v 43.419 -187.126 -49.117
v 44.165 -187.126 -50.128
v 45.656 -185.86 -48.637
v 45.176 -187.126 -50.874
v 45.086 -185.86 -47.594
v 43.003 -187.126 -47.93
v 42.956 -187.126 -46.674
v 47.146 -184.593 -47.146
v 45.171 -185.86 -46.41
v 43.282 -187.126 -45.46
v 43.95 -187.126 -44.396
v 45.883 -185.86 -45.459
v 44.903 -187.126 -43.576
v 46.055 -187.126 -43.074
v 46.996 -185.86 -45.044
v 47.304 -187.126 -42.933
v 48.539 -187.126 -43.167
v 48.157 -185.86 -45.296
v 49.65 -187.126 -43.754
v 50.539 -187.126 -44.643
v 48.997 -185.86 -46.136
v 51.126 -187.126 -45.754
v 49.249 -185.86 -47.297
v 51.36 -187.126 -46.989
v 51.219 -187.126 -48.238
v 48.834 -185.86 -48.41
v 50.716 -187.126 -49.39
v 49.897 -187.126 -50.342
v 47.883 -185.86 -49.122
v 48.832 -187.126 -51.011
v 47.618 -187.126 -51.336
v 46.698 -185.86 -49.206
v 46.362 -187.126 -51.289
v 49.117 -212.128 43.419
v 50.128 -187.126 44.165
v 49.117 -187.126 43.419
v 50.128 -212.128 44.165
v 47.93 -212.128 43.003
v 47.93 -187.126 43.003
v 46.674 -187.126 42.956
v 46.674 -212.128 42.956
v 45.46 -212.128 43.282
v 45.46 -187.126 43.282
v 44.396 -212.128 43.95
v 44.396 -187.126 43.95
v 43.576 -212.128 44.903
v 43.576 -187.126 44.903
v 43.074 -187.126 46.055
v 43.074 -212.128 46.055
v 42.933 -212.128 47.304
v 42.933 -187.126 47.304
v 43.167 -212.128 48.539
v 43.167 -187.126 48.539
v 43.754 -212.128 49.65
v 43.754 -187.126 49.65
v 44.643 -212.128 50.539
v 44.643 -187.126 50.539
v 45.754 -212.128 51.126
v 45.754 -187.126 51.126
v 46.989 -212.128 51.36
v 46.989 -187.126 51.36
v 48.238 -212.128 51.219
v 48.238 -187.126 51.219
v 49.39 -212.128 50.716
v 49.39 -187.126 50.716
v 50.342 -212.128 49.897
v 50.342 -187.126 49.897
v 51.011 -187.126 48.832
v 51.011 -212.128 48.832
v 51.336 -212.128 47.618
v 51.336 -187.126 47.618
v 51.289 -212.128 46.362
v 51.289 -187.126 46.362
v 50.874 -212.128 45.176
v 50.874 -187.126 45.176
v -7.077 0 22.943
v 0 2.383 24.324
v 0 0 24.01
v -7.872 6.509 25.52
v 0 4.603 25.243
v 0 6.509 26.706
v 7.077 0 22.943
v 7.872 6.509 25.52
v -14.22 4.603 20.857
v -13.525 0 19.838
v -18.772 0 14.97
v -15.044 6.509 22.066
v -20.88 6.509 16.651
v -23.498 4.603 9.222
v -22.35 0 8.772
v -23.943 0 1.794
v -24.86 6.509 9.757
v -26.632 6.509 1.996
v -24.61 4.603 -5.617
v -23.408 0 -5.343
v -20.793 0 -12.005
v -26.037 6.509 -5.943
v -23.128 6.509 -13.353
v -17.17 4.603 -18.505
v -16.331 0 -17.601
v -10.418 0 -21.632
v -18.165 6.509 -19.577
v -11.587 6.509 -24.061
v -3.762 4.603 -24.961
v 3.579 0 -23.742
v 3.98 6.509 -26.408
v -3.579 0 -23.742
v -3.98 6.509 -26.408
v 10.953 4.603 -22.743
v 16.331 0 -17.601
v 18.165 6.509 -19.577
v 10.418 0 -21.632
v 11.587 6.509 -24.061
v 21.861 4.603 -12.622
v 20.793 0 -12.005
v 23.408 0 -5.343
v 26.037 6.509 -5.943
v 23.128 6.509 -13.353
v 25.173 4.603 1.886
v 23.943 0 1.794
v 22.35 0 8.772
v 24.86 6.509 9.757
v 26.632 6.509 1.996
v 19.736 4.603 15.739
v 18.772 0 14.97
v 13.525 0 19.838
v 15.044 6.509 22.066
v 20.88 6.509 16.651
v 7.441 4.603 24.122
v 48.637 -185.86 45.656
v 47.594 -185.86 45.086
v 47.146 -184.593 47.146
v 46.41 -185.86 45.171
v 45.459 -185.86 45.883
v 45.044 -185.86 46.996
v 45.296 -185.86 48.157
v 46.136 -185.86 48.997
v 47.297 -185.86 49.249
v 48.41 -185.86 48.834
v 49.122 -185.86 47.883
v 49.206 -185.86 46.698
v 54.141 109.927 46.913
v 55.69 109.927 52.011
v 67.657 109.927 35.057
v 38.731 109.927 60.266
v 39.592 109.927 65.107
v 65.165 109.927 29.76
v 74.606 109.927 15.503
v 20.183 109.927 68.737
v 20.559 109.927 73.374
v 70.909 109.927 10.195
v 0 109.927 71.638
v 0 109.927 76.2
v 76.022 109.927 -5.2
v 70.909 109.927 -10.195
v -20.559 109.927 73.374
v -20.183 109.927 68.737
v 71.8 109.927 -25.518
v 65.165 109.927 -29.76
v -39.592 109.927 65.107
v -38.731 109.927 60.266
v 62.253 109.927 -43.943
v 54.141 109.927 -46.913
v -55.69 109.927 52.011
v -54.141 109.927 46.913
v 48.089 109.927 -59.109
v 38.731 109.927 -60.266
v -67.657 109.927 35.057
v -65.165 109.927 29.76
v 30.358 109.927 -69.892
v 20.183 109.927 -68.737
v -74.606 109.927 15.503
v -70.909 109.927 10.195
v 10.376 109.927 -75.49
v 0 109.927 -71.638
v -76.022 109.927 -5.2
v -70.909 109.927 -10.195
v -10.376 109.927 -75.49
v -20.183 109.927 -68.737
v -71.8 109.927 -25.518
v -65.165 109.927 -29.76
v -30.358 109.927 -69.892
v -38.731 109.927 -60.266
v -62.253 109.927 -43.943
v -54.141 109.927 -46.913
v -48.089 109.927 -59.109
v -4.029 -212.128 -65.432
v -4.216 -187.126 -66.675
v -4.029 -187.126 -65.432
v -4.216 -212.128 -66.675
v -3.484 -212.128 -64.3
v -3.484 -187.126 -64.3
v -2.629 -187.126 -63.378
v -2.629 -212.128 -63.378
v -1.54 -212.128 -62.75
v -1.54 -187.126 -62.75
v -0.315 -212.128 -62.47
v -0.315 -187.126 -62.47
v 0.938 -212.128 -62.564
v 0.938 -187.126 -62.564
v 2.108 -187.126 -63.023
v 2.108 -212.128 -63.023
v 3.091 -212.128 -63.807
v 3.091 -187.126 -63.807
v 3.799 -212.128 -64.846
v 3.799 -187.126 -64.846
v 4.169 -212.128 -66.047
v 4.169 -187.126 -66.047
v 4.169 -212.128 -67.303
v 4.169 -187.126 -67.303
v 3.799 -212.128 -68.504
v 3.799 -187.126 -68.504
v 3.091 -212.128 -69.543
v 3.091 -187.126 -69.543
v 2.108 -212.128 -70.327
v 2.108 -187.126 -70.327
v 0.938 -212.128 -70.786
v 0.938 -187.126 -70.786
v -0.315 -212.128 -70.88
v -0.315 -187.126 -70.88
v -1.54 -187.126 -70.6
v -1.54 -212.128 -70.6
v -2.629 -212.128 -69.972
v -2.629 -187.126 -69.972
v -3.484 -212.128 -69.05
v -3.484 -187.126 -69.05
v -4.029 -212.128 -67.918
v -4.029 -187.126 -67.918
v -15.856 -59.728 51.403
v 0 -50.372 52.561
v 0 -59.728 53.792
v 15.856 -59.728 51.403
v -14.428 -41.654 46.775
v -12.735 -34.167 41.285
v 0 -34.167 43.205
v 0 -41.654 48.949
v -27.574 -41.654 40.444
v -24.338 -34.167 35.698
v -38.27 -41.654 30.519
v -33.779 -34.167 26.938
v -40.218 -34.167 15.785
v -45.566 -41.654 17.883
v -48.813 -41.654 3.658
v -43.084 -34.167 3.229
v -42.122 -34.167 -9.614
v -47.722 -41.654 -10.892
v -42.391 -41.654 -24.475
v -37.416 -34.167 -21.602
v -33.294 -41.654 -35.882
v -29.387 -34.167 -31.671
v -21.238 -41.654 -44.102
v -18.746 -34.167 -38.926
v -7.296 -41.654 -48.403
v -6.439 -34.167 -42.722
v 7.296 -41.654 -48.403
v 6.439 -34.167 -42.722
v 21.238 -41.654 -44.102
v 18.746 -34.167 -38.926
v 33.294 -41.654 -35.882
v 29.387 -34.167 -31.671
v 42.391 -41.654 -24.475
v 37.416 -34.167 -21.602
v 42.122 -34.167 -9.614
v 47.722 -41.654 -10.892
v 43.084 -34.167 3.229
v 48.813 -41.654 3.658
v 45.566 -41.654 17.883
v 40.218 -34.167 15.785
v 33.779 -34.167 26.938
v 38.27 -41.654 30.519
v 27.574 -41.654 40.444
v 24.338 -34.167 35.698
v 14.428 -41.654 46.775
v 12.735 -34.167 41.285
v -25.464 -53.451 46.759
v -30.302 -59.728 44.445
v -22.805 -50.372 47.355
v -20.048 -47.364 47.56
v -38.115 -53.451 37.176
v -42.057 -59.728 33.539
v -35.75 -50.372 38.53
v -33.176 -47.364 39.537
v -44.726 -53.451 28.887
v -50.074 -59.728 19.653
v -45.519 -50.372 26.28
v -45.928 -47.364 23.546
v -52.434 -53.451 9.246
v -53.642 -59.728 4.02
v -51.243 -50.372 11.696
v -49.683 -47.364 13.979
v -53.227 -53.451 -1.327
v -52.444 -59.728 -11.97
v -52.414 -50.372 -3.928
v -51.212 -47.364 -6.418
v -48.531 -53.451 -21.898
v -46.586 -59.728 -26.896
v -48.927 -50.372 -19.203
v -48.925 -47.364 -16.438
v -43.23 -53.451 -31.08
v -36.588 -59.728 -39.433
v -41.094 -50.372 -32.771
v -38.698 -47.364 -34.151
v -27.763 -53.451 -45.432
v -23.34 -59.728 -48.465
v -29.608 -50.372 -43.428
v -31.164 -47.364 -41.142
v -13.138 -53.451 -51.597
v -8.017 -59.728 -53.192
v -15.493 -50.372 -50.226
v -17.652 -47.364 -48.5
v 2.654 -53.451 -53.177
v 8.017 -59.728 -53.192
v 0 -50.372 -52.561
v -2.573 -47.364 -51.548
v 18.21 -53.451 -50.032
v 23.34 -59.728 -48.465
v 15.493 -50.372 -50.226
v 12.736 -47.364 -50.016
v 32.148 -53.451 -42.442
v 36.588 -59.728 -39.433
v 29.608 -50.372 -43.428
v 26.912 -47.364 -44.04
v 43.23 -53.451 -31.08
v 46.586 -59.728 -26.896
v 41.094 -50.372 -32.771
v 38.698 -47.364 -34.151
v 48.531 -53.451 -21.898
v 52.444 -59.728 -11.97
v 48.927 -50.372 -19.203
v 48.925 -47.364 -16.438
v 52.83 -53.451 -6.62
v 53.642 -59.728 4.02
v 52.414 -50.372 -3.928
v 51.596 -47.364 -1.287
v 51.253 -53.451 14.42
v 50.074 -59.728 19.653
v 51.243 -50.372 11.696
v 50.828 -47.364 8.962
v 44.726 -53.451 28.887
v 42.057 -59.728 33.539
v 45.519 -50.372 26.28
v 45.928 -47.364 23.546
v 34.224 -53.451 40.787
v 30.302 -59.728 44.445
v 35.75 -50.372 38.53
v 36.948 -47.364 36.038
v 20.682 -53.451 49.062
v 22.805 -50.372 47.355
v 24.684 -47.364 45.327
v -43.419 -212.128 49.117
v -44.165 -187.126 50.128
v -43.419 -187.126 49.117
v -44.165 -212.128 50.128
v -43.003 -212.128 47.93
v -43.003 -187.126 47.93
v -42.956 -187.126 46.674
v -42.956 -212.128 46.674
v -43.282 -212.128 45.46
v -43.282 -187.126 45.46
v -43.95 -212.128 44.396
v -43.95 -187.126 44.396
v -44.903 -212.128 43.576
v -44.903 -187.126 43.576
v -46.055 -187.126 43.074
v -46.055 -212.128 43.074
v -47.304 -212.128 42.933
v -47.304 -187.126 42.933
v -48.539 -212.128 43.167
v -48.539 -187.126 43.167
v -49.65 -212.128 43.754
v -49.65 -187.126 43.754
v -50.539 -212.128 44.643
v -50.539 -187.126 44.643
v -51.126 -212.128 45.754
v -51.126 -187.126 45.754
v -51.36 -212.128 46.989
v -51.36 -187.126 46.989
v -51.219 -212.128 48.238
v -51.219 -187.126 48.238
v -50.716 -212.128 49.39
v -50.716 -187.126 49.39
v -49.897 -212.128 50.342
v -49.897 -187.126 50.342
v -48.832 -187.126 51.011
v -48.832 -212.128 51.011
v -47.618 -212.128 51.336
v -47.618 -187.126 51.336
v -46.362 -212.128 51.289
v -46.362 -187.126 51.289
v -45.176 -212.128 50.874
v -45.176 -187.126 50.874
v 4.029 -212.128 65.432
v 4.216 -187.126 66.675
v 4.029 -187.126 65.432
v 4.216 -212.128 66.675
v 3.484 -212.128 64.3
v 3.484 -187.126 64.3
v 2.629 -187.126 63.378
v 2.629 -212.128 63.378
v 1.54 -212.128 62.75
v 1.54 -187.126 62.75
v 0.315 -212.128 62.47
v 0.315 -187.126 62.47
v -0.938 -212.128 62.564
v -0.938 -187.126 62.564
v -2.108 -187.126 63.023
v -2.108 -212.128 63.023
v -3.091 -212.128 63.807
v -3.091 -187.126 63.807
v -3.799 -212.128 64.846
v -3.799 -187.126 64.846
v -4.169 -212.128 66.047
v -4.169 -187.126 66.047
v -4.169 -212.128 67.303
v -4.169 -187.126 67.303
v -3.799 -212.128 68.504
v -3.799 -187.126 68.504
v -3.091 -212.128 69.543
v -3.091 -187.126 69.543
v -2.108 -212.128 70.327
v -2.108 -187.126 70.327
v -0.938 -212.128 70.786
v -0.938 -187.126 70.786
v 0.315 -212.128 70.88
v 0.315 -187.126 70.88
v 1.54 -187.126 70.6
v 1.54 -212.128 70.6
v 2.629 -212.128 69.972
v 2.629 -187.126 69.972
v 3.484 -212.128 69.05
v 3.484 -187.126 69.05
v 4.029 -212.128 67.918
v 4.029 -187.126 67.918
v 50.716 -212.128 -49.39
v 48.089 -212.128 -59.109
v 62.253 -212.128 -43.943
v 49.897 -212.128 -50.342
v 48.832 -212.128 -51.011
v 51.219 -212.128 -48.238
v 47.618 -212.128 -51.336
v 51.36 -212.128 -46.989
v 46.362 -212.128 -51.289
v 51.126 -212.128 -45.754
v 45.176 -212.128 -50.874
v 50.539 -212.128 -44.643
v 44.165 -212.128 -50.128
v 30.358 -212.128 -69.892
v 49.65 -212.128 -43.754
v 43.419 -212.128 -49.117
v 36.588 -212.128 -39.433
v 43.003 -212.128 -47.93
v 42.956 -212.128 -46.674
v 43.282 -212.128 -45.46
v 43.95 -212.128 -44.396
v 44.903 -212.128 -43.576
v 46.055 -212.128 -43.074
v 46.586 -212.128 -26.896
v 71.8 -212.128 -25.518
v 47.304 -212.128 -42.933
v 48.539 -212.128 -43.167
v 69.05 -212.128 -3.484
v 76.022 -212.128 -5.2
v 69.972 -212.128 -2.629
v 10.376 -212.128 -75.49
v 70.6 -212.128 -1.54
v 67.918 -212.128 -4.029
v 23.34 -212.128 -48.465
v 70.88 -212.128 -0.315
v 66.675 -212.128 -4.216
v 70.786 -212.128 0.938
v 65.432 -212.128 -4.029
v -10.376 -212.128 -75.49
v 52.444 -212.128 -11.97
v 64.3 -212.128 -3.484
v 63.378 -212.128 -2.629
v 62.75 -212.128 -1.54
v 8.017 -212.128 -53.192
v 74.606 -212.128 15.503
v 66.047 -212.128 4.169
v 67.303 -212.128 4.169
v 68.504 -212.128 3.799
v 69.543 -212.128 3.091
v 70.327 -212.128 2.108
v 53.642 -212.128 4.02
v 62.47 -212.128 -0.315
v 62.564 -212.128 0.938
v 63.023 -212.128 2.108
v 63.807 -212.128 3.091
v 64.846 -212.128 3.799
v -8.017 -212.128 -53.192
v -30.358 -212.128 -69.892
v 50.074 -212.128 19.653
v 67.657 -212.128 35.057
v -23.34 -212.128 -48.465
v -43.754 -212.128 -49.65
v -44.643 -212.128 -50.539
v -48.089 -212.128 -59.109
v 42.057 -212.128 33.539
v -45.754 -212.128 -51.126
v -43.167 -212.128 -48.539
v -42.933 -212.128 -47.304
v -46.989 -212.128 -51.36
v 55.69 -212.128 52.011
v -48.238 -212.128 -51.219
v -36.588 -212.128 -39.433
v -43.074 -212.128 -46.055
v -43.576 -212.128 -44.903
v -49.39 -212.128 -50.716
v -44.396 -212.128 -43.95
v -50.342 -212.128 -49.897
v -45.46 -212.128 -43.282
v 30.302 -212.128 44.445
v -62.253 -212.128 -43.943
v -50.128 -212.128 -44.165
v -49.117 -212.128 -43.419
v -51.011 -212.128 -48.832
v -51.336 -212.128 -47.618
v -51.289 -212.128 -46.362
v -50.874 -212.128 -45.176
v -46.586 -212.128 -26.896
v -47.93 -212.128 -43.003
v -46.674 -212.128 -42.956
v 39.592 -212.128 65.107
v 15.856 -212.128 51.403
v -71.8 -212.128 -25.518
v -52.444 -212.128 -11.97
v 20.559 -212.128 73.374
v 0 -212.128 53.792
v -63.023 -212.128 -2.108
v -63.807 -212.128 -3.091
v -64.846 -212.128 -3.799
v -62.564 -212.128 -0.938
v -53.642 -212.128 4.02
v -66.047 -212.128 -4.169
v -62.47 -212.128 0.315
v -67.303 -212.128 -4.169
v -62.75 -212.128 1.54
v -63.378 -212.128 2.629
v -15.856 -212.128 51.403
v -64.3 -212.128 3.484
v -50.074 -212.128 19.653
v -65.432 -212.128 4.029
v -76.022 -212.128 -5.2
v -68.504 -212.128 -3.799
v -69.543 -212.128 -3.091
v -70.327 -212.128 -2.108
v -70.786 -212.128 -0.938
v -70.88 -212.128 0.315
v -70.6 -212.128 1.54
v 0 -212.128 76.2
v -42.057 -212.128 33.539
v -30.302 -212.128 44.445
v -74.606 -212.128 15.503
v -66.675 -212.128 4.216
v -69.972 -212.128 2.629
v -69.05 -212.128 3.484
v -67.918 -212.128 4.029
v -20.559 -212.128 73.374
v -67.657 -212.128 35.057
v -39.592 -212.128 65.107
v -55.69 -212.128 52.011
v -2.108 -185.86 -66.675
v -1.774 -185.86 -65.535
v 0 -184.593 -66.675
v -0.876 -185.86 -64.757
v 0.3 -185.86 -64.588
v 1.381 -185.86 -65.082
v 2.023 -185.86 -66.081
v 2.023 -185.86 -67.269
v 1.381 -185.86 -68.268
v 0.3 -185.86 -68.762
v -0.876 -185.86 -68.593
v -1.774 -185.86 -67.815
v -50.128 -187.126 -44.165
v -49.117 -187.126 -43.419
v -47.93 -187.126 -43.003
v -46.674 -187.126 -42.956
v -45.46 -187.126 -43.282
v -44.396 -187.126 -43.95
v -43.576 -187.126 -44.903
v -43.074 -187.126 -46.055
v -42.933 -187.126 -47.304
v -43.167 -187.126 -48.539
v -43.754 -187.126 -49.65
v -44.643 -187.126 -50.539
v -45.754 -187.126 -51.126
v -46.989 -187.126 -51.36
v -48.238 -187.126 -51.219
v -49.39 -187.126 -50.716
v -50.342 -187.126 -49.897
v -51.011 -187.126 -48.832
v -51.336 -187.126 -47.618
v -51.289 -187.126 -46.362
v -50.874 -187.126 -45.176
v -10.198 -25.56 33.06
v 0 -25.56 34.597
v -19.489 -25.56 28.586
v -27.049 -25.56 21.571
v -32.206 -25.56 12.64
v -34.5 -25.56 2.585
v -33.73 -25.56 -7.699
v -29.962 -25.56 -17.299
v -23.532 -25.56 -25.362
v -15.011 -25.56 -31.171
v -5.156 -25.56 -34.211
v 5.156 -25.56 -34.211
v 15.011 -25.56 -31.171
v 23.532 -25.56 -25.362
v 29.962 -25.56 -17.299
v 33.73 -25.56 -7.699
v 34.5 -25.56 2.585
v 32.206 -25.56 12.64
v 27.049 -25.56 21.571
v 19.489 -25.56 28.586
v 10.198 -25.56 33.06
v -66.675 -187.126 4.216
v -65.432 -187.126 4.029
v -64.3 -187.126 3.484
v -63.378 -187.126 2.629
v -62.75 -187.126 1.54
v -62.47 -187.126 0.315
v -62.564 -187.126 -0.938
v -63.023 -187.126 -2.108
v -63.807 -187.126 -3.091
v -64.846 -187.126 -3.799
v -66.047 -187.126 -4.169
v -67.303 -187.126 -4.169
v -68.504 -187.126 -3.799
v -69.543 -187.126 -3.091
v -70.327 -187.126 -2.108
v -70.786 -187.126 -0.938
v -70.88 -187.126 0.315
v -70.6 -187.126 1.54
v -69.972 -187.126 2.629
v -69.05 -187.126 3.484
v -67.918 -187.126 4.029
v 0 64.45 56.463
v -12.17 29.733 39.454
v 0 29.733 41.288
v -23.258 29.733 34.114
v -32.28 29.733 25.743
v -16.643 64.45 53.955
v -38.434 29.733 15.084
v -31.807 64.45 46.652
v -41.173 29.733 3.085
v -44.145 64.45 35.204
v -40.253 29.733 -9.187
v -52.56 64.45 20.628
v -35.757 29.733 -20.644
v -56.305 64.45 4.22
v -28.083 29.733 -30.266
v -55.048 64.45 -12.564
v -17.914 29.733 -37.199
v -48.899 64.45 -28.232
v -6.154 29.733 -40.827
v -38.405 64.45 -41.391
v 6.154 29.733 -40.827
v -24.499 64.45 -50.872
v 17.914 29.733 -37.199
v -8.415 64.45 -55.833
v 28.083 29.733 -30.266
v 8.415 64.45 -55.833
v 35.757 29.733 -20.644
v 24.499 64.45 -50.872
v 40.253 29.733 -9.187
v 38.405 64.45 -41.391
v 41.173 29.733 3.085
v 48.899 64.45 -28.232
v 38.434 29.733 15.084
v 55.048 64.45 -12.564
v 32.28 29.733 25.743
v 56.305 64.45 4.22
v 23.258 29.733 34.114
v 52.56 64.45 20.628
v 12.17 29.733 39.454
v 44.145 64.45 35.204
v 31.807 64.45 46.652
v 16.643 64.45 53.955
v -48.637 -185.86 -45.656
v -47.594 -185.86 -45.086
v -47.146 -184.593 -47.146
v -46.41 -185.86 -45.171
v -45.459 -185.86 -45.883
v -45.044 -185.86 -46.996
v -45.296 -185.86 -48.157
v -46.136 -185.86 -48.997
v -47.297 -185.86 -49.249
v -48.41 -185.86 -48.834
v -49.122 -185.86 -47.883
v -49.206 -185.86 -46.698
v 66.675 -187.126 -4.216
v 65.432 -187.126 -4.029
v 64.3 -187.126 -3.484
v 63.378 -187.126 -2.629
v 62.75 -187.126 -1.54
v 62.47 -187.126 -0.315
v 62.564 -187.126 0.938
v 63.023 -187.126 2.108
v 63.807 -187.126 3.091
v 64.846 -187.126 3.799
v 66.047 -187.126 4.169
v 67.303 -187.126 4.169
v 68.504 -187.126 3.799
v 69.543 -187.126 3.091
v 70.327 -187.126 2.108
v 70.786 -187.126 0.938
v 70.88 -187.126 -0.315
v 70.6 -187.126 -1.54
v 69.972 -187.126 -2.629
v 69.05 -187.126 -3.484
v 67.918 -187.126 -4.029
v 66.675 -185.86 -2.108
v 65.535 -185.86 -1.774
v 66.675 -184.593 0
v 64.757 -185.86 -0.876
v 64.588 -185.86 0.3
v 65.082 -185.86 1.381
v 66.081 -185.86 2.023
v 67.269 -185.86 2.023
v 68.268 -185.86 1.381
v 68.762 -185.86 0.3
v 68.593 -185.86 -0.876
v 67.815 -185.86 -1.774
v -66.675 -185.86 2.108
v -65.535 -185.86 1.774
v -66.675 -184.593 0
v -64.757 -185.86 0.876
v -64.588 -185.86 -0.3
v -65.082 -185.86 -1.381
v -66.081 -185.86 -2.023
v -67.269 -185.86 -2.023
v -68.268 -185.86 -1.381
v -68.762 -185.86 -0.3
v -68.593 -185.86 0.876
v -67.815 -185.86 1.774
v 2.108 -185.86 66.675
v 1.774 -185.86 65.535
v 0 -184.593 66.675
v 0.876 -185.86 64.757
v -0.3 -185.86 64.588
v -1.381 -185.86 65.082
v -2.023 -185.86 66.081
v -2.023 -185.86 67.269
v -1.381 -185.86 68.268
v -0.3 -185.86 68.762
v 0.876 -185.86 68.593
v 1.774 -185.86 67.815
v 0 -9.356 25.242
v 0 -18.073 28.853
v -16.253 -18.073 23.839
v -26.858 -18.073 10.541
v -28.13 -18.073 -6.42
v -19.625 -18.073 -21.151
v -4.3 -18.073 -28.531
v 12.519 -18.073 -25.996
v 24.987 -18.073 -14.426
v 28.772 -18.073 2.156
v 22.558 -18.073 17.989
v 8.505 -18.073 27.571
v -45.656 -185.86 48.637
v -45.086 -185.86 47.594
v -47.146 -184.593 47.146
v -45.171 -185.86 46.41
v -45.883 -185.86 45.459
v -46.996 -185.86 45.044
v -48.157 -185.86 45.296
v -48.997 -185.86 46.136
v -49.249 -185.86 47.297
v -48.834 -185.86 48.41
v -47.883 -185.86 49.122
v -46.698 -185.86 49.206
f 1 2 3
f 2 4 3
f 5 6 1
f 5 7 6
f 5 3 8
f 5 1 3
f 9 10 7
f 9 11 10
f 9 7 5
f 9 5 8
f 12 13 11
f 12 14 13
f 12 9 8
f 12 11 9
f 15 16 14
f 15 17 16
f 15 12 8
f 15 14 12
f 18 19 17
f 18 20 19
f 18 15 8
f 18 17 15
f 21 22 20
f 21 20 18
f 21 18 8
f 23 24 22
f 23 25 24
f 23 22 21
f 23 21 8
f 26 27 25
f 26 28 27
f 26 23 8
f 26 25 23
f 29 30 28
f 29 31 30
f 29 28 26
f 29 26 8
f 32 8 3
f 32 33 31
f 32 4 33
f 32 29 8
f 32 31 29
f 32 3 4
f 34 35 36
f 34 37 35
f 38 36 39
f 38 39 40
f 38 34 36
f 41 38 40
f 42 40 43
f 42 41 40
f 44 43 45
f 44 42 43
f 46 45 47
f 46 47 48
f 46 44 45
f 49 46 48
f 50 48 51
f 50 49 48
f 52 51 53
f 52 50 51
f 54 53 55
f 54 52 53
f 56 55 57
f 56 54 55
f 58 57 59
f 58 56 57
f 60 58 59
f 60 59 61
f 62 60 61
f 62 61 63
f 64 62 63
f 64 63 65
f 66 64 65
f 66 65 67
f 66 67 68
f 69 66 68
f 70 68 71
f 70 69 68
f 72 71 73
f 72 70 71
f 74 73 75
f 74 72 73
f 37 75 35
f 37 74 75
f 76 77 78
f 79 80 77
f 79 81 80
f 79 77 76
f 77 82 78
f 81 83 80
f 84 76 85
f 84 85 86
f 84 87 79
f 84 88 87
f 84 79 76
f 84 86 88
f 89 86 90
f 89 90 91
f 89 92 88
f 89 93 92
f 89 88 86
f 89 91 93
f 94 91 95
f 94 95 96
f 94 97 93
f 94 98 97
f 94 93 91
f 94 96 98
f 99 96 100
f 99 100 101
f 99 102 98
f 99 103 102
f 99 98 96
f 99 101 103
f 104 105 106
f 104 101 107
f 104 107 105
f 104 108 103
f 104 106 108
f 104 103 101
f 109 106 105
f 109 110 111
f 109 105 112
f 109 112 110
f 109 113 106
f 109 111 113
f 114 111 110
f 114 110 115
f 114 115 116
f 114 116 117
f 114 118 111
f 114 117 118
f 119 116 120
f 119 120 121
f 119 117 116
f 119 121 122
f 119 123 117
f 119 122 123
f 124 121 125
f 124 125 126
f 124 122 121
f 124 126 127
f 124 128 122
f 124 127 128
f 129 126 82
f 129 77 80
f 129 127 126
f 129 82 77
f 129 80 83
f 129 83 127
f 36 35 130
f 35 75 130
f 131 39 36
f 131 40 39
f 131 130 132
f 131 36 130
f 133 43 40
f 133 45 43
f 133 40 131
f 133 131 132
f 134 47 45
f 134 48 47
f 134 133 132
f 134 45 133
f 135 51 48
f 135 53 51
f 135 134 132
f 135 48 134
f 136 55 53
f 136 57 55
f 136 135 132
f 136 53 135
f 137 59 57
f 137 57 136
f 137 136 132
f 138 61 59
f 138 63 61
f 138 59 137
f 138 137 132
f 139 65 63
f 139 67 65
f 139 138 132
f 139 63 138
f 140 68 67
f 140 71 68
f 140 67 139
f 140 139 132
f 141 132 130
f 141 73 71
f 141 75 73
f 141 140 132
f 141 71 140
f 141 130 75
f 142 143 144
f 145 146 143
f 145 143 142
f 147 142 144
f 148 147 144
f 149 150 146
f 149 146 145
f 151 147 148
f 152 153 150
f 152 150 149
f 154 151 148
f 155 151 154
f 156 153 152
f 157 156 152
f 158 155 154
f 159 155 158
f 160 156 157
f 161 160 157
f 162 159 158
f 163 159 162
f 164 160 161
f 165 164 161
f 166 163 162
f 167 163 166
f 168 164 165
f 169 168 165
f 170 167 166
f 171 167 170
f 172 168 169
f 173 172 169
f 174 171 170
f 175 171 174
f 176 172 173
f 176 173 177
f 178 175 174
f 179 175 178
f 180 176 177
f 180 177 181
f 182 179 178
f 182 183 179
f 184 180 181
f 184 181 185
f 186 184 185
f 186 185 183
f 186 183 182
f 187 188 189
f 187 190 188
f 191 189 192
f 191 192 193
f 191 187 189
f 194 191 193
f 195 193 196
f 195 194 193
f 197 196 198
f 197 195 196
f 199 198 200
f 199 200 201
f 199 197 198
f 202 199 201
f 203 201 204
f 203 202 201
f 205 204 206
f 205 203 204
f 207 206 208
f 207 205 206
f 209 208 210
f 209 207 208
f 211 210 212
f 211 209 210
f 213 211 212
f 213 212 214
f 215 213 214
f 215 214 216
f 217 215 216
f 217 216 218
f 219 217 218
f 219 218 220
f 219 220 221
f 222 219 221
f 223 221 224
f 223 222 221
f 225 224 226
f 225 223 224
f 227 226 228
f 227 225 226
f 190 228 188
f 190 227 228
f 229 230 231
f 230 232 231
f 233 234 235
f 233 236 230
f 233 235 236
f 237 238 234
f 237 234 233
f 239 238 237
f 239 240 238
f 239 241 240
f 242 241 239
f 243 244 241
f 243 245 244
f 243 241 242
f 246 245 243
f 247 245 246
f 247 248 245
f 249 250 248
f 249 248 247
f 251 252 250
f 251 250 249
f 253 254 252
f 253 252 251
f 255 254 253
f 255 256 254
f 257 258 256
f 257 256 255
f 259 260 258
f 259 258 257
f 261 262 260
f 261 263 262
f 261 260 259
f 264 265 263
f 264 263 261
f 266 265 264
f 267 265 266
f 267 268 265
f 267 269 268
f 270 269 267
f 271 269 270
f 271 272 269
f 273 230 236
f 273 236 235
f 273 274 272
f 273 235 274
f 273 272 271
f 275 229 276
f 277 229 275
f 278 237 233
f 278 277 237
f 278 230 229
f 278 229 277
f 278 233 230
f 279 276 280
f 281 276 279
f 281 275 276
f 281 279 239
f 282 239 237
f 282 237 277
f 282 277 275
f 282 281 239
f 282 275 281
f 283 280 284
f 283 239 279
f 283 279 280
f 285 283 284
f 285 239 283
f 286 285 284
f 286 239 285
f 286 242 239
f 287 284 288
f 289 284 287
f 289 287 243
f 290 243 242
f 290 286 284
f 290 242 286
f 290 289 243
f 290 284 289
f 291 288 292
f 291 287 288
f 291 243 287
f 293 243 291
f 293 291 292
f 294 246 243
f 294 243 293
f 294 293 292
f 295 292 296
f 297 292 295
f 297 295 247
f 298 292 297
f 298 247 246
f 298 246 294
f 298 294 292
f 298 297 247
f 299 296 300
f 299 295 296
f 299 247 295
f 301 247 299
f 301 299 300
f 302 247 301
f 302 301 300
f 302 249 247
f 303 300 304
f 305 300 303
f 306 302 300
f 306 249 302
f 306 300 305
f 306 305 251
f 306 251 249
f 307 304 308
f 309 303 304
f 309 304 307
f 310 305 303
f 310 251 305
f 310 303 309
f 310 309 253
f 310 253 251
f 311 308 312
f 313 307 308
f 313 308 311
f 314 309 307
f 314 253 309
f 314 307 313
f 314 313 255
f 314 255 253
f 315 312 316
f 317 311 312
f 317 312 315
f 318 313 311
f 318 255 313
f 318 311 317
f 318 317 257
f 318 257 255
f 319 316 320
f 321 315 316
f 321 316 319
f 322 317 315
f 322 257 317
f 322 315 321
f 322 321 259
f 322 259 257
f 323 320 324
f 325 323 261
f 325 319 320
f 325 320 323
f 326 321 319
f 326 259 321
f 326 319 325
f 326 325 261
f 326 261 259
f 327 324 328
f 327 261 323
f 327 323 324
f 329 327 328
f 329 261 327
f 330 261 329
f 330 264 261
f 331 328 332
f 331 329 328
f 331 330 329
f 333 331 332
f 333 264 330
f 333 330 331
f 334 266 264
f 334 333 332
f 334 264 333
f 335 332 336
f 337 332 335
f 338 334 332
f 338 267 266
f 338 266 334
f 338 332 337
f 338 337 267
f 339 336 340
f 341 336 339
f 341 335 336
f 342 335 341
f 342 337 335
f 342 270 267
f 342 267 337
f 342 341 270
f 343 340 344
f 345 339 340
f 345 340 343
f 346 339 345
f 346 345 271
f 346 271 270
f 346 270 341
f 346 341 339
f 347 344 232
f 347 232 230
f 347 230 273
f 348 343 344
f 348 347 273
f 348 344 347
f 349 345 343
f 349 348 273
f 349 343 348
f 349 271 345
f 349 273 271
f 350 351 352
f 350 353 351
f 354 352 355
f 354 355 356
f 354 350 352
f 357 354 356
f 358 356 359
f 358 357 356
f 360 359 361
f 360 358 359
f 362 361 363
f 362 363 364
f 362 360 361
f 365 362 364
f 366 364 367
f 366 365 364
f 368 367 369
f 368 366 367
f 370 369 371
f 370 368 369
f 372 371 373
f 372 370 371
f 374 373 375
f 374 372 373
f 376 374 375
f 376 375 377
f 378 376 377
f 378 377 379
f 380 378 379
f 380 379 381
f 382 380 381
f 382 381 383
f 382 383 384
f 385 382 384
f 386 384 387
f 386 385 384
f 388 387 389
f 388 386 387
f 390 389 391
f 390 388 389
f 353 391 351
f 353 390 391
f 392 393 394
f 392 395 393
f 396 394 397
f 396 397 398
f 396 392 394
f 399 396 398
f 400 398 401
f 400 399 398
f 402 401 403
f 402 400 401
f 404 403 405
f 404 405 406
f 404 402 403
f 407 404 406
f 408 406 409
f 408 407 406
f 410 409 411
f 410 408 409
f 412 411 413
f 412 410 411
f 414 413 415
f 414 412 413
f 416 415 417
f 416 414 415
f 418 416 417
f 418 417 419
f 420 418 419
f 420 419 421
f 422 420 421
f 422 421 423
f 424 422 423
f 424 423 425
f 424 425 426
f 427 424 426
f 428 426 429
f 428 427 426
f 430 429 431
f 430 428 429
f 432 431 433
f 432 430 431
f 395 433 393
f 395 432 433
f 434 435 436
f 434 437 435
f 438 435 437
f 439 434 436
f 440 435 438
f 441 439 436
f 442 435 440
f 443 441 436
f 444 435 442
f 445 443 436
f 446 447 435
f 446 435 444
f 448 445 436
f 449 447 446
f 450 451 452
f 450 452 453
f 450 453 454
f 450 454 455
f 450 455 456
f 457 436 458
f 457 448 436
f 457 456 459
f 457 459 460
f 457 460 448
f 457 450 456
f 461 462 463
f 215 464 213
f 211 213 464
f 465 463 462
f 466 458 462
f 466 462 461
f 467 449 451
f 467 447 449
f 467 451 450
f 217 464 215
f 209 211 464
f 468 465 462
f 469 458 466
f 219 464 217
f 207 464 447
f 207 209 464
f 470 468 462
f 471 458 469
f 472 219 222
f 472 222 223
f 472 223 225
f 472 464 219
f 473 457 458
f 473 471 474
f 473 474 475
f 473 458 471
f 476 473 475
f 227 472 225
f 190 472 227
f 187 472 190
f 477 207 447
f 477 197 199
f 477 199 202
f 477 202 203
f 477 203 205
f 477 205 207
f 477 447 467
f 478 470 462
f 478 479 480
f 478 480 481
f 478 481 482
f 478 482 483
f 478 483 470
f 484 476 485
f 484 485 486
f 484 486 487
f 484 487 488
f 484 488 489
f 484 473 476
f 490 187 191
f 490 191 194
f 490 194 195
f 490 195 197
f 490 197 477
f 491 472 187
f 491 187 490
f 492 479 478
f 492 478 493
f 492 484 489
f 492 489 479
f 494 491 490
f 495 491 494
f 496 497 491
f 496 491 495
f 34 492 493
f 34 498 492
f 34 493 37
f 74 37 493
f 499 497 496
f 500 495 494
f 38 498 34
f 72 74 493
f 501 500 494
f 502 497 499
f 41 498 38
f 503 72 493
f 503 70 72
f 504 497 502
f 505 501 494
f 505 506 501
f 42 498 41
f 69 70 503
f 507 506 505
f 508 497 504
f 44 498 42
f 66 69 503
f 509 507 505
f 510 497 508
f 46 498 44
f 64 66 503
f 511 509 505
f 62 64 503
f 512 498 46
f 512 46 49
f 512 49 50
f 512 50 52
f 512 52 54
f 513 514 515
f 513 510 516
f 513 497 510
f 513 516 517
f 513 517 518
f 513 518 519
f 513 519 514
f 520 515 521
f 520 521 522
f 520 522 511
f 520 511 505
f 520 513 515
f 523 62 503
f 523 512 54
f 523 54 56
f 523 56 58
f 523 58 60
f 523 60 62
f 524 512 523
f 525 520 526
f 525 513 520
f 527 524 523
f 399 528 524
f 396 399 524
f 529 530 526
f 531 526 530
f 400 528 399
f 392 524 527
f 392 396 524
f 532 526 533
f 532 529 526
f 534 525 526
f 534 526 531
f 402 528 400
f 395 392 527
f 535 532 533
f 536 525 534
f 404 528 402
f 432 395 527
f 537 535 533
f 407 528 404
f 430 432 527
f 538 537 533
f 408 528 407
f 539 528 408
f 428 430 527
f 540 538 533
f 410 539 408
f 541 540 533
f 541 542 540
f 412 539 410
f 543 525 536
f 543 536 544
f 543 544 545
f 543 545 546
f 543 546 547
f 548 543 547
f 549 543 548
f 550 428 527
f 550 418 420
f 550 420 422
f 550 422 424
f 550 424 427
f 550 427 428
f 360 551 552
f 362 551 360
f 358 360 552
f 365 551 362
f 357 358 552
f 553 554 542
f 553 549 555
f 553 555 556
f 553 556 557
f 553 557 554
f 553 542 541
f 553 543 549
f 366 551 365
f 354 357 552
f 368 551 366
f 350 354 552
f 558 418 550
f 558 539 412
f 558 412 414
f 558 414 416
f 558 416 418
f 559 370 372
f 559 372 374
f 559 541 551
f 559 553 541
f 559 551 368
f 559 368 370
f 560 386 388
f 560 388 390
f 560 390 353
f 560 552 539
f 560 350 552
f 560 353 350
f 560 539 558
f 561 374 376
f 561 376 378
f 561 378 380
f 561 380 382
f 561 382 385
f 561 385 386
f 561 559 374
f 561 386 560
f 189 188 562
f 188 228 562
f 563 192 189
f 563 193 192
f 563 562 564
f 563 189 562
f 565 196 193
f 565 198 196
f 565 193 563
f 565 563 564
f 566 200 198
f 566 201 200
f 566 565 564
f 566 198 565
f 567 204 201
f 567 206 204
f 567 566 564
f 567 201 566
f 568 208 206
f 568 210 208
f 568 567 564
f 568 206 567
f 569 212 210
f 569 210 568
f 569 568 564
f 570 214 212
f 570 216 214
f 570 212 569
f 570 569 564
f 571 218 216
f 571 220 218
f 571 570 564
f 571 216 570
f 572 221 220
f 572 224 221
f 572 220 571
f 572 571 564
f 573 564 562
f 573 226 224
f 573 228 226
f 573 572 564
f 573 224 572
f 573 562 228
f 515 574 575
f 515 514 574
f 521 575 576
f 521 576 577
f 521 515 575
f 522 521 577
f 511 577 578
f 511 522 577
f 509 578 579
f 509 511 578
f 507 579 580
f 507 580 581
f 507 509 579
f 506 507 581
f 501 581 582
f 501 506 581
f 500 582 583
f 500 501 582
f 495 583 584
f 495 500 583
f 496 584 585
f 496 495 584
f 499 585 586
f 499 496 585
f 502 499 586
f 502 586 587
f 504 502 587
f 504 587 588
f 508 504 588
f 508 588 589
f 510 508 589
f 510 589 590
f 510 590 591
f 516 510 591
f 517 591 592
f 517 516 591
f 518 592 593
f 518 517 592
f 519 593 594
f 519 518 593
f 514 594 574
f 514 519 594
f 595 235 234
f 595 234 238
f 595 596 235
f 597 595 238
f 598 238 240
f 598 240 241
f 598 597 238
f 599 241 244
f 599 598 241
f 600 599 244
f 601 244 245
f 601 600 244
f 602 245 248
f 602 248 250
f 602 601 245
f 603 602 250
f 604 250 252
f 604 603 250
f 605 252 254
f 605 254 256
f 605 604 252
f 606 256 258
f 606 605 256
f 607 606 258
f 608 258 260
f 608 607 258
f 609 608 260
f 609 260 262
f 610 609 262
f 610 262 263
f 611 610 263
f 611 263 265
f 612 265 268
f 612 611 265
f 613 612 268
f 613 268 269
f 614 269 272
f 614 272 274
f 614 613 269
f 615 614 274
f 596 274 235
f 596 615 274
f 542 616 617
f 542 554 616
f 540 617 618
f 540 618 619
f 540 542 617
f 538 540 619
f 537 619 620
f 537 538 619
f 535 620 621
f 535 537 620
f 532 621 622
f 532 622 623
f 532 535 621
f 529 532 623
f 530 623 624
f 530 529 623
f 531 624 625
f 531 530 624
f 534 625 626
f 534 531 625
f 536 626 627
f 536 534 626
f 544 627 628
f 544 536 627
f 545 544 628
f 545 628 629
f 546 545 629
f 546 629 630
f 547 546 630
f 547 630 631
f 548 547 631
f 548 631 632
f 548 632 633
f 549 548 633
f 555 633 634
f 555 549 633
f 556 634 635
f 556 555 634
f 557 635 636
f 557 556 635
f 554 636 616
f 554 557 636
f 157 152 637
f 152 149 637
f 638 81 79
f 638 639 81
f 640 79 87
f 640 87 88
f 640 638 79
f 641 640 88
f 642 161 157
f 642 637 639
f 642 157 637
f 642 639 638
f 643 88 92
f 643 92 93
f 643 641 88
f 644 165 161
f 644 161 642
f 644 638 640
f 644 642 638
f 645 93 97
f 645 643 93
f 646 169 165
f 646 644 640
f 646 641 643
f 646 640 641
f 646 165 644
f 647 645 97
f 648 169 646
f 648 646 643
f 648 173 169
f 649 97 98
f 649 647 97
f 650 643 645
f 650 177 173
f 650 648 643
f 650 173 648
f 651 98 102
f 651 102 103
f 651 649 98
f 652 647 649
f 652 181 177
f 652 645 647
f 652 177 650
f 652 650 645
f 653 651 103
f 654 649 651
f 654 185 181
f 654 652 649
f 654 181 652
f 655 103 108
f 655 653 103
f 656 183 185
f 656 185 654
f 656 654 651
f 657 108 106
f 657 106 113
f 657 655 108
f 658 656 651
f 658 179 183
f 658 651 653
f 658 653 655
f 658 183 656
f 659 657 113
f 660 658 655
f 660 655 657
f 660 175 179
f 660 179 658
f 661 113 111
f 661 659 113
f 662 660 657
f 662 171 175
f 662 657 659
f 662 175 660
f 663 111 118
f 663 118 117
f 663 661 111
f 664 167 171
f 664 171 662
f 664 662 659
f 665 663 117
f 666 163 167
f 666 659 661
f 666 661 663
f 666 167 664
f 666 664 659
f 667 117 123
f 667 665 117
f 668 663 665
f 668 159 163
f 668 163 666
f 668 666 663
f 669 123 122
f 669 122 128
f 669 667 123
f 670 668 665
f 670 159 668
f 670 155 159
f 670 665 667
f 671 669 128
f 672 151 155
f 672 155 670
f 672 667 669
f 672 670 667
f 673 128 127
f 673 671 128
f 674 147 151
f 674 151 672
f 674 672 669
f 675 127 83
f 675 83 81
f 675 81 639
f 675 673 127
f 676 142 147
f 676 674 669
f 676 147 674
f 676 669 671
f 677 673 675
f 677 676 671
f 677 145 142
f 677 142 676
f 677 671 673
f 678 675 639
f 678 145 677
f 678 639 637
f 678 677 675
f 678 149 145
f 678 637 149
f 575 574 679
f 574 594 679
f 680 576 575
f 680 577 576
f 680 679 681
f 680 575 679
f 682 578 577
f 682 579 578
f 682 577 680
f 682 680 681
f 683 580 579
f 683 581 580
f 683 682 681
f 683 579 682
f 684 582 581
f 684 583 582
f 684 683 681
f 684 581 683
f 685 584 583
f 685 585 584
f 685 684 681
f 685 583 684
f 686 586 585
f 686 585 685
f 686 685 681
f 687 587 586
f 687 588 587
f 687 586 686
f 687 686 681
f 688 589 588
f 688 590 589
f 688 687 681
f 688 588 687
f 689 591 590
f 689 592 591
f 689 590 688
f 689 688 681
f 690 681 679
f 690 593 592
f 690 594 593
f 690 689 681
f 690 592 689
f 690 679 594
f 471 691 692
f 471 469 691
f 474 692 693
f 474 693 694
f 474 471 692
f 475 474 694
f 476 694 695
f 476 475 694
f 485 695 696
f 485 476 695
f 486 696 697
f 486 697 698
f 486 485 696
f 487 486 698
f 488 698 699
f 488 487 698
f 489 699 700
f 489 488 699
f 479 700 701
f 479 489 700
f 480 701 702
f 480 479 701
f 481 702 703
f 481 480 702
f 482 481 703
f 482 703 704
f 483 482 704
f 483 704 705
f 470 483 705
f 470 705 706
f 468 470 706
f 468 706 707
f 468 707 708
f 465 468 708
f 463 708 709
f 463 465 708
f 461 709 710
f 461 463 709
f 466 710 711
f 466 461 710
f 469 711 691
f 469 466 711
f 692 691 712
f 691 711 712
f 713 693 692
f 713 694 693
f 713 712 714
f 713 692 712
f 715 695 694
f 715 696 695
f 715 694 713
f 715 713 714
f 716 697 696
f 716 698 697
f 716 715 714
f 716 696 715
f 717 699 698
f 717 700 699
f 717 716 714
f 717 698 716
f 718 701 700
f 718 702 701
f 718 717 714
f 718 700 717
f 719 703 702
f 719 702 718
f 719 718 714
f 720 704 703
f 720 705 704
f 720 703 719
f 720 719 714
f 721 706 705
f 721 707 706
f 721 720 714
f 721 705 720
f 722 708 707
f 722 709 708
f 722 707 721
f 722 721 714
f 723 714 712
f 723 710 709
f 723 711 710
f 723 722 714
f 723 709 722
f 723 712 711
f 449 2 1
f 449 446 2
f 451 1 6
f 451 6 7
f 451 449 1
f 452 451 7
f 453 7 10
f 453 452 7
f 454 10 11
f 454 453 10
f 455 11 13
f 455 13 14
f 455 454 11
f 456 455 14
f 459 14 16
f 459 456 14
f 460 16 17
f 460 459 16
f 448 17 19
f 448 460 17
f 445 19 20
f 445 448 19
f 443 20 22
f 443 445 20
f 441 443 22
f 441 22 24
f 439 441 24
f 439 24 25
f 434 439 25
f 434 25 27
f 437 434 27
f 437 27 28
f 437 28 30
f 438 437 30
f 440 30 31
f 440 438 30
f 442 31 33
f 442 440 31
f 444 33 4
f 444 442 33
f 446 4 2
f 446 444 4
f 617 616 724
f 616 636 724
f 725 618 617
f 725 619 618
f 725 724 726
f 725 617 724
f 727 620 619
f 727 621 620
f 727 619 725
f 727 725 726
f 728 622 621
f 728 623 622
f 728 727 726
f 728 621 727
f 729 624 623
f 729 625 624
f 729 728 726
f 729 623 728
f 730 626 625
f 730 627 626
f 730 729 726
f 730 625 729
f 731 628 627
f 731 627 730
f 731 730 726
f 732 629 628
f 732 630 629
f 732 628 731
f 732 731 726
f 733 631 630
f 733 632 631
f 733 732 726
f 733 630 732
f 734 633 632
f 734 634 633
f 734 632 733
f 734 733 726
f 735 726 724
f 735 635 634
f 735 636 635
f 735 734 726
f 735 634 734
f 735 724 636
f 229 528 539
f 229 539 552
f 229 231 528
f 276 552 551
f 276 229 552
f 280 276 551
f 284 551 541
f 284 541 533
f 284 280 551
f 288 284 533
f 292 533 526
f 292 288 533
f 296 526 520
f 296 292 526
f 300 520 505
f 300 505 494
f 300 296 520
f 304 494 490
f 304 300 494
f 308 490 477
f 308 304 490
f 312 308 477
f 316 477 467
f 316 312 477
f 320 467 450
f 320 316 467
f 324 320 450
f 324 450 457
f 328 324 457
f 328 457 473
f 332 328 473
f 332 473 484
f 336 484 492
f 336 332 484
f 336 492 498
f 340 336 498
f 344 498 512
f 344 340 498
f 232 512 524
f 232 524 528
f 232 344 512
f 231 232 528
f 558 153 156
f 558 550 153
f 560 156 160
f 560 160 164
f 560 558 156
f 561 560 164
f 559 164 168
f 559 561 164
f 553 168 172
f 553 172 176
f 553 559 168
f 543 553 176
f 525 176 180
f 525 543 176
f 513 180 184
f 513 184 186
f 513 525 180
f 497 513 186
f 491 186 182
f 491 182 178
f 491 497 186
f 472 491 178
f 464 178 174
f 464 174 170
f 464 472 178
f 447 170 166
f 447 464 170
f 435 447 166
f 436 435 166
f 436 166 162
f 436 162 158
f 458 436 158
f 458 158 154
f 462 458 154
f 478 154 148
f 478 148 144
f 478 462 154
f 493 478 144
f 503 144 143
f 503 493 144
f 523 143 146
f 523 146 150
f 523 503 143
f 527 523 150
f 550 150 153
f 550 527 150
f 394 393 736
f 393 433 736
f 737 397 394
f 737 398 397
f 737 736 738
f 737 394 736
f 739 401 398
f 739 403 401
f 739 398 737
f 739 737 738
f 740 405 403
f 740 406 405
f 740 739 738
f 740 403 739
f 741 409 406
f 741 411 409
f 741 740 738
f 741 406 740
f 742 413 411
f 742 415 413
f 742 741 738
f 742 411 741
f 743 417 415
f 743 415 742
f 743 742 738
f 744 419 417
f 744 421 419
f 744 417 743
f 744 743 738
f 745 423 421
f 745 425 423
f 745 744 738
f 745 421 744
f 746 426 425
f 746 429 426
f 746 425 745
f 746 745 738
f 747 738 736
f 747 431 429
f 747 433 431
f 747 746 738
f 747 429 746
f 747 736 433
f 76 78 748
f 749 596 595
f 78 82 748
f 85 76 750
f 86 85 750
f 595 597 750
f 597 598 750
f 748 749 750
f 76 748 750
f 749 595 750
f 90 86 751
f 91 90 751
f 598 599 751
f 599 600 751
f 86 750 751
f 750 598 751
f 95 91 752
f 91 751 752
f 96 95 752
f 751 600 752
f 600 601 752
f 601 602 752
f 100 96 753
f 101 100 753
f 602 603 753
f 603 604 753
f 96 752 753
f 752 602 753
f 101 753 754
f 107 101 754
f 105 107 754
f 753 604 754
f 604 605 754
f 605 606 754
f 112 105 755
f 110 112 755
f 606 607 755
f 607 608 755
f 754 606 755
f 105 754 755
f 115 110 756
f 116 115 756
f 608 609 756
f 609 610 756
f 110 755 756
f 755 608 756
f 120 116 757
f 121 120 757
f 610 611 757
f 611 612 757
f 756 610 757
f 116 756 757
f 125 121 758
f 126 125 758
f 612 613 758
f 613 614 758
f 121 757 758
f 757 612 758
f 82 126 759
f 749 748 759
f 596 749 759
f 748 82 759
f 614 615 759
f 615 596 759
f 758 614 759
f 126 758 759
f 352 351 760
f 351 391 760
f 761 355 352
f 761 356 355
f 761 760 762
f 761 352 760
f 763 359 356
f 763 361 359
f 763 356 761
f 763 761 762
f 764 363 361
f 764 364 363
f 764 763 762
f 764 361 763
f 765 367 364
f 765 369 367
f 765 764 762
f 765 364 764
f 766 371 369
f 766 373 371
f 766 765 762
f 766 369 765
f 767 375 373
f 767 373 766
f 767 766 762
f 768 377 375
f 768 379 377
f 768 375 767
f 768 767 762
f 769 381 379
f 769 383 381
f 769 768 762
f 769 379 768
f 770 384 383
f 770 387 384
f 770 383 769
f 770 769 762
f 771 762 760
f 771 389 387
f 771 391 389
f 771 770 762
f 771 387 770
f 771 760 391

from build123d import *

# Parameters (mm, degrees)
CIRPATTERN1_COUNT = 8


with BuildPart() as part:
    # Sketch1 → Revolve2 (revolve)
    with BuildSketch(Plane.XY):
        with BuildLine():
            Line((71.638455479, 109.927347077), (76.2, 109.927347077))
            Line((76.2, 109.927347077), (76.2, -212.12767375))
            Line((76.2, -212.12767375), (53.792460136, -212.12767375))
            Line((53.792460136, -212.12767375), (53.792460136, -59.72767375))
            add(Edge.make_bspline(
                [(53.792460136, -59.72767375), (53.792458904, -59.65714368), (53.79192976, -59.515566627), (53.789553906, -59.18172514), (53.783229304, -58.904956016), (53.773743812, -58.532728011), (53.761100911, -58.212998146), (53.741350078, -57.781754967), (53.711337732, -57.281120424), (53.667125562, -56.68815869), (53.588220883, -55.848640892), (53.488359283, -55.008326387), (53.367608198, -54.172595959), (53.197743223, -53.17258577), (53.002996576, -52.177603354), (52.777307499, -51.188699619), (52.520946592, -50.207649576), (52.240221697, -49.233238281), (51.935281085, -48.266129768), (51.544470164, -47.149295616), (51.050452679, -45.89056896), (50.509666057, -44.651129364), (49.922993218, -43.432862093), (49.291052508, -42.237253813), (48.615057493, -41.066315461), (47.895407771, -39.921133247), (47.134034376, -38.804236838), (46.430801288, -37.851612392), (45.804470156, -37.055832736), (45.263749892, -36.403541902), (44.826059154, -35.894408258), (44.42570839, -35.447153287), (44.092389699, -35.084791818), (43.784856817, -34.760500788), (43.585004597, -34.55171009), (43.35532426, -34.318676929), (43.254715338, -34.217322698), (43.20484319, -34.167450311)],
                knots=[0.082637729, 0.082637729, 0.082637729, 0.082637729, 0.082637729, 0.092574926, 0.102512123, 0.11244932, 0.122386517, 0.132323714, 0.142260911, 0.162135305, 0.182009699, 0.201884093, 0.24163288, 0.261507274, 0.281381668, 0.321130456, 0.360879243, 0.380753637, 0.400628031, 0.440376819, 0.480125606, 0.519874394, 0.559623181, 0.599371969, 0.639120757, 0.678869544, 0.718618332, 0.75836712, 0.798115907, 0.817990301, 0.837864695, 0.857739089, 0.877613483, 0.88755068, 0.897487877, 0.907425074, 0.91736227, 0.91736227, 0.91736227, 0.91736227, 0.91736227], degree=4))
            Line((43.20484319, -34.167450311), (34.597214993, -25.559822115))
            add(Edge.make_bspline(
                [(24.01, 0), (24.010001231, -0.070528647), (24.010530378, -0.21358419), (24.012906064, -0.543182916), (24.019230459, -0.824160397), (24.028715581, -1.194822072), (24.041357874, -1.513435058), (24.057158099, -1.861939603), (24.076113358, -2.193706872), (24.103750973, -2.6180694), (24.143219181, -3.122033947), (24.214231843, -3.879978675), (24.334058816, -4.886450388), (24.510418185, -6.05671076), (24.761817377, -7.385166415), (25.062727461, -8.703574514), (25.412702774, -10.009637208), (25.811293137, -11.301819596), (26.257877549, -12.578099334), (26.751935483, -13.836887483), (27.292605285, -15.076197128), (27.879411553, -16.294609793), (28.511071567, -17.489938793), (29.187464568, -18.661287756), (29.906377277, -19.805743395), (30.668954178, -20.923860073), (31.370099373, -21.874411759), (31.999668305, -22.673445479), (32.535060601, -23.320422136), (32.983187953, -23.840005015), (33.419382213, -24.329816244), (33.846758309, -24.788484388), (34.156490828, -25.113868308), (34.447792147, -25.409649045), (34.547344615, -25.50994993), (34.597214993, -25.559822115)],
                knots=[0.082637729, 0.082637729, 0.082637729, 0.082637729, 0.082637729, 0.092574926, 0.102512123, 0.11244932, 0.122386517, 0.132323714, 0.142260911, 0.152198108, 0.162135305, 0.182009699, 0.201884093, 0.24163288, 0.281381668, 0.321130456, 0.360879243, 0.400628031, 0.440376819, 0.480125606, 0.519874394, 0.559623181, 0.599371969, 0.639120757, 0.678869544, 0.718618332, 0.75836712, 0.798115907, 0.817990301, 0.837864695, 0.857739089, 0.877613483, 0.897487877, 0.907425074, 0.91736227, 0.91736227, 0.91736227, 0.91736227, 0.91736227], degree=4))
            add(Edge.make_bspline(
                [(24.01, 0), (24.010000626, 0.035892652), (24.010538457, 0.11011369), (24.012955849, 0.267641069), (24.019393694, 0.427064117), (24.031465725, 0.646764266), (24.052367213, 0.901433328), (24.086116845, 1.202537273), (24.137431431, 1.542050498), (24.201475827, 1.880996777), (24.278073727, 2.21635442), (24.367255697, 2.549239421), (24.468673539, 2.878092645), (24.582551197, 3.203347041), (24.708128897, 3.523627157), (24.846218103, 3.839666733), (24.995002427, 4.149282184), (25.156944348, 4.454783123), (25.327420631, 4.751301575), (25.513446847, 5.045703861), (25.702720396, 5.325518936), (25.9153376, 5.610727543), (26.0898085, 5.832913647), (26.277277882, 6.049951637), (26.415487374, 6.208641646), (26.581374196, 6.382121779), (26.655452387, 6.458478841), (26.706211329, 6.50923965)],
                knots=[0.082568816, 0.082568816, 0.082568816, 0.082568816, 0.082568816, 0.102426634, 0.122284453, 0.142142271, 0.162000089, 0.201715725, 0.241431362, 0.281146998, 0.320862634, 0.360578271, 0.400293907, 0.440009544, 0.47972518, 0.519440816, 0.559156453, 0.598872089, 0.638587725, 0.678303362, 0.718018998, 0.757734635, 0.797450271, 0.837165907, 0.857023726, 0.876881544, 0.91659718, 0.91659718, 0.91659718, 0.91659718, 0.91659718], degree=4))
            add(Edge.make_bspline(
                [(26.706211329, 6.50923965), (49.172333461, 34.635954224), (71.638455479, 109.927347077)],
                knots=[0, 0, 0, 1, 1, 1], degree=2))
        make_face()
    revolve(axis=Axis((0, 0, 0), (0, -1, 0)))

    # Sketch4 → 3/8-24 Tapped Hole1 (revolve, cut)
    with BuildSketch(Plane(origin=(66.675, -212.12767375, 0), x_dir=(0, 0, -1), z_dir=(1, 0, 0))):
        Polygon((0, 0), (0, 27.534688714), (4.2164, 25.00122), (4.2164, 0), align=None)
    f_3_8_24_tapped_hole1 = revolve(axis=Axis((66.675, -218.47767375, 0), (0, 1, 0)), mode=Mode.SUBTRACT)

    # CirPattern1: 3/8-24 Tapped Hole1 ×8 about axis
    cirpattern1_axis = Axis((0, -212.12767375, 0), (0, 1, 0))
    for i in range(1, CIRPATTERN1_COUNT):
        add(f_3_8_24_tapped_hole1.rotate(cirpattern1_axis, i * 360 / CIRPATTERN1_COUNT), mode=Mode.SUBTRACT)


solid = part.part
